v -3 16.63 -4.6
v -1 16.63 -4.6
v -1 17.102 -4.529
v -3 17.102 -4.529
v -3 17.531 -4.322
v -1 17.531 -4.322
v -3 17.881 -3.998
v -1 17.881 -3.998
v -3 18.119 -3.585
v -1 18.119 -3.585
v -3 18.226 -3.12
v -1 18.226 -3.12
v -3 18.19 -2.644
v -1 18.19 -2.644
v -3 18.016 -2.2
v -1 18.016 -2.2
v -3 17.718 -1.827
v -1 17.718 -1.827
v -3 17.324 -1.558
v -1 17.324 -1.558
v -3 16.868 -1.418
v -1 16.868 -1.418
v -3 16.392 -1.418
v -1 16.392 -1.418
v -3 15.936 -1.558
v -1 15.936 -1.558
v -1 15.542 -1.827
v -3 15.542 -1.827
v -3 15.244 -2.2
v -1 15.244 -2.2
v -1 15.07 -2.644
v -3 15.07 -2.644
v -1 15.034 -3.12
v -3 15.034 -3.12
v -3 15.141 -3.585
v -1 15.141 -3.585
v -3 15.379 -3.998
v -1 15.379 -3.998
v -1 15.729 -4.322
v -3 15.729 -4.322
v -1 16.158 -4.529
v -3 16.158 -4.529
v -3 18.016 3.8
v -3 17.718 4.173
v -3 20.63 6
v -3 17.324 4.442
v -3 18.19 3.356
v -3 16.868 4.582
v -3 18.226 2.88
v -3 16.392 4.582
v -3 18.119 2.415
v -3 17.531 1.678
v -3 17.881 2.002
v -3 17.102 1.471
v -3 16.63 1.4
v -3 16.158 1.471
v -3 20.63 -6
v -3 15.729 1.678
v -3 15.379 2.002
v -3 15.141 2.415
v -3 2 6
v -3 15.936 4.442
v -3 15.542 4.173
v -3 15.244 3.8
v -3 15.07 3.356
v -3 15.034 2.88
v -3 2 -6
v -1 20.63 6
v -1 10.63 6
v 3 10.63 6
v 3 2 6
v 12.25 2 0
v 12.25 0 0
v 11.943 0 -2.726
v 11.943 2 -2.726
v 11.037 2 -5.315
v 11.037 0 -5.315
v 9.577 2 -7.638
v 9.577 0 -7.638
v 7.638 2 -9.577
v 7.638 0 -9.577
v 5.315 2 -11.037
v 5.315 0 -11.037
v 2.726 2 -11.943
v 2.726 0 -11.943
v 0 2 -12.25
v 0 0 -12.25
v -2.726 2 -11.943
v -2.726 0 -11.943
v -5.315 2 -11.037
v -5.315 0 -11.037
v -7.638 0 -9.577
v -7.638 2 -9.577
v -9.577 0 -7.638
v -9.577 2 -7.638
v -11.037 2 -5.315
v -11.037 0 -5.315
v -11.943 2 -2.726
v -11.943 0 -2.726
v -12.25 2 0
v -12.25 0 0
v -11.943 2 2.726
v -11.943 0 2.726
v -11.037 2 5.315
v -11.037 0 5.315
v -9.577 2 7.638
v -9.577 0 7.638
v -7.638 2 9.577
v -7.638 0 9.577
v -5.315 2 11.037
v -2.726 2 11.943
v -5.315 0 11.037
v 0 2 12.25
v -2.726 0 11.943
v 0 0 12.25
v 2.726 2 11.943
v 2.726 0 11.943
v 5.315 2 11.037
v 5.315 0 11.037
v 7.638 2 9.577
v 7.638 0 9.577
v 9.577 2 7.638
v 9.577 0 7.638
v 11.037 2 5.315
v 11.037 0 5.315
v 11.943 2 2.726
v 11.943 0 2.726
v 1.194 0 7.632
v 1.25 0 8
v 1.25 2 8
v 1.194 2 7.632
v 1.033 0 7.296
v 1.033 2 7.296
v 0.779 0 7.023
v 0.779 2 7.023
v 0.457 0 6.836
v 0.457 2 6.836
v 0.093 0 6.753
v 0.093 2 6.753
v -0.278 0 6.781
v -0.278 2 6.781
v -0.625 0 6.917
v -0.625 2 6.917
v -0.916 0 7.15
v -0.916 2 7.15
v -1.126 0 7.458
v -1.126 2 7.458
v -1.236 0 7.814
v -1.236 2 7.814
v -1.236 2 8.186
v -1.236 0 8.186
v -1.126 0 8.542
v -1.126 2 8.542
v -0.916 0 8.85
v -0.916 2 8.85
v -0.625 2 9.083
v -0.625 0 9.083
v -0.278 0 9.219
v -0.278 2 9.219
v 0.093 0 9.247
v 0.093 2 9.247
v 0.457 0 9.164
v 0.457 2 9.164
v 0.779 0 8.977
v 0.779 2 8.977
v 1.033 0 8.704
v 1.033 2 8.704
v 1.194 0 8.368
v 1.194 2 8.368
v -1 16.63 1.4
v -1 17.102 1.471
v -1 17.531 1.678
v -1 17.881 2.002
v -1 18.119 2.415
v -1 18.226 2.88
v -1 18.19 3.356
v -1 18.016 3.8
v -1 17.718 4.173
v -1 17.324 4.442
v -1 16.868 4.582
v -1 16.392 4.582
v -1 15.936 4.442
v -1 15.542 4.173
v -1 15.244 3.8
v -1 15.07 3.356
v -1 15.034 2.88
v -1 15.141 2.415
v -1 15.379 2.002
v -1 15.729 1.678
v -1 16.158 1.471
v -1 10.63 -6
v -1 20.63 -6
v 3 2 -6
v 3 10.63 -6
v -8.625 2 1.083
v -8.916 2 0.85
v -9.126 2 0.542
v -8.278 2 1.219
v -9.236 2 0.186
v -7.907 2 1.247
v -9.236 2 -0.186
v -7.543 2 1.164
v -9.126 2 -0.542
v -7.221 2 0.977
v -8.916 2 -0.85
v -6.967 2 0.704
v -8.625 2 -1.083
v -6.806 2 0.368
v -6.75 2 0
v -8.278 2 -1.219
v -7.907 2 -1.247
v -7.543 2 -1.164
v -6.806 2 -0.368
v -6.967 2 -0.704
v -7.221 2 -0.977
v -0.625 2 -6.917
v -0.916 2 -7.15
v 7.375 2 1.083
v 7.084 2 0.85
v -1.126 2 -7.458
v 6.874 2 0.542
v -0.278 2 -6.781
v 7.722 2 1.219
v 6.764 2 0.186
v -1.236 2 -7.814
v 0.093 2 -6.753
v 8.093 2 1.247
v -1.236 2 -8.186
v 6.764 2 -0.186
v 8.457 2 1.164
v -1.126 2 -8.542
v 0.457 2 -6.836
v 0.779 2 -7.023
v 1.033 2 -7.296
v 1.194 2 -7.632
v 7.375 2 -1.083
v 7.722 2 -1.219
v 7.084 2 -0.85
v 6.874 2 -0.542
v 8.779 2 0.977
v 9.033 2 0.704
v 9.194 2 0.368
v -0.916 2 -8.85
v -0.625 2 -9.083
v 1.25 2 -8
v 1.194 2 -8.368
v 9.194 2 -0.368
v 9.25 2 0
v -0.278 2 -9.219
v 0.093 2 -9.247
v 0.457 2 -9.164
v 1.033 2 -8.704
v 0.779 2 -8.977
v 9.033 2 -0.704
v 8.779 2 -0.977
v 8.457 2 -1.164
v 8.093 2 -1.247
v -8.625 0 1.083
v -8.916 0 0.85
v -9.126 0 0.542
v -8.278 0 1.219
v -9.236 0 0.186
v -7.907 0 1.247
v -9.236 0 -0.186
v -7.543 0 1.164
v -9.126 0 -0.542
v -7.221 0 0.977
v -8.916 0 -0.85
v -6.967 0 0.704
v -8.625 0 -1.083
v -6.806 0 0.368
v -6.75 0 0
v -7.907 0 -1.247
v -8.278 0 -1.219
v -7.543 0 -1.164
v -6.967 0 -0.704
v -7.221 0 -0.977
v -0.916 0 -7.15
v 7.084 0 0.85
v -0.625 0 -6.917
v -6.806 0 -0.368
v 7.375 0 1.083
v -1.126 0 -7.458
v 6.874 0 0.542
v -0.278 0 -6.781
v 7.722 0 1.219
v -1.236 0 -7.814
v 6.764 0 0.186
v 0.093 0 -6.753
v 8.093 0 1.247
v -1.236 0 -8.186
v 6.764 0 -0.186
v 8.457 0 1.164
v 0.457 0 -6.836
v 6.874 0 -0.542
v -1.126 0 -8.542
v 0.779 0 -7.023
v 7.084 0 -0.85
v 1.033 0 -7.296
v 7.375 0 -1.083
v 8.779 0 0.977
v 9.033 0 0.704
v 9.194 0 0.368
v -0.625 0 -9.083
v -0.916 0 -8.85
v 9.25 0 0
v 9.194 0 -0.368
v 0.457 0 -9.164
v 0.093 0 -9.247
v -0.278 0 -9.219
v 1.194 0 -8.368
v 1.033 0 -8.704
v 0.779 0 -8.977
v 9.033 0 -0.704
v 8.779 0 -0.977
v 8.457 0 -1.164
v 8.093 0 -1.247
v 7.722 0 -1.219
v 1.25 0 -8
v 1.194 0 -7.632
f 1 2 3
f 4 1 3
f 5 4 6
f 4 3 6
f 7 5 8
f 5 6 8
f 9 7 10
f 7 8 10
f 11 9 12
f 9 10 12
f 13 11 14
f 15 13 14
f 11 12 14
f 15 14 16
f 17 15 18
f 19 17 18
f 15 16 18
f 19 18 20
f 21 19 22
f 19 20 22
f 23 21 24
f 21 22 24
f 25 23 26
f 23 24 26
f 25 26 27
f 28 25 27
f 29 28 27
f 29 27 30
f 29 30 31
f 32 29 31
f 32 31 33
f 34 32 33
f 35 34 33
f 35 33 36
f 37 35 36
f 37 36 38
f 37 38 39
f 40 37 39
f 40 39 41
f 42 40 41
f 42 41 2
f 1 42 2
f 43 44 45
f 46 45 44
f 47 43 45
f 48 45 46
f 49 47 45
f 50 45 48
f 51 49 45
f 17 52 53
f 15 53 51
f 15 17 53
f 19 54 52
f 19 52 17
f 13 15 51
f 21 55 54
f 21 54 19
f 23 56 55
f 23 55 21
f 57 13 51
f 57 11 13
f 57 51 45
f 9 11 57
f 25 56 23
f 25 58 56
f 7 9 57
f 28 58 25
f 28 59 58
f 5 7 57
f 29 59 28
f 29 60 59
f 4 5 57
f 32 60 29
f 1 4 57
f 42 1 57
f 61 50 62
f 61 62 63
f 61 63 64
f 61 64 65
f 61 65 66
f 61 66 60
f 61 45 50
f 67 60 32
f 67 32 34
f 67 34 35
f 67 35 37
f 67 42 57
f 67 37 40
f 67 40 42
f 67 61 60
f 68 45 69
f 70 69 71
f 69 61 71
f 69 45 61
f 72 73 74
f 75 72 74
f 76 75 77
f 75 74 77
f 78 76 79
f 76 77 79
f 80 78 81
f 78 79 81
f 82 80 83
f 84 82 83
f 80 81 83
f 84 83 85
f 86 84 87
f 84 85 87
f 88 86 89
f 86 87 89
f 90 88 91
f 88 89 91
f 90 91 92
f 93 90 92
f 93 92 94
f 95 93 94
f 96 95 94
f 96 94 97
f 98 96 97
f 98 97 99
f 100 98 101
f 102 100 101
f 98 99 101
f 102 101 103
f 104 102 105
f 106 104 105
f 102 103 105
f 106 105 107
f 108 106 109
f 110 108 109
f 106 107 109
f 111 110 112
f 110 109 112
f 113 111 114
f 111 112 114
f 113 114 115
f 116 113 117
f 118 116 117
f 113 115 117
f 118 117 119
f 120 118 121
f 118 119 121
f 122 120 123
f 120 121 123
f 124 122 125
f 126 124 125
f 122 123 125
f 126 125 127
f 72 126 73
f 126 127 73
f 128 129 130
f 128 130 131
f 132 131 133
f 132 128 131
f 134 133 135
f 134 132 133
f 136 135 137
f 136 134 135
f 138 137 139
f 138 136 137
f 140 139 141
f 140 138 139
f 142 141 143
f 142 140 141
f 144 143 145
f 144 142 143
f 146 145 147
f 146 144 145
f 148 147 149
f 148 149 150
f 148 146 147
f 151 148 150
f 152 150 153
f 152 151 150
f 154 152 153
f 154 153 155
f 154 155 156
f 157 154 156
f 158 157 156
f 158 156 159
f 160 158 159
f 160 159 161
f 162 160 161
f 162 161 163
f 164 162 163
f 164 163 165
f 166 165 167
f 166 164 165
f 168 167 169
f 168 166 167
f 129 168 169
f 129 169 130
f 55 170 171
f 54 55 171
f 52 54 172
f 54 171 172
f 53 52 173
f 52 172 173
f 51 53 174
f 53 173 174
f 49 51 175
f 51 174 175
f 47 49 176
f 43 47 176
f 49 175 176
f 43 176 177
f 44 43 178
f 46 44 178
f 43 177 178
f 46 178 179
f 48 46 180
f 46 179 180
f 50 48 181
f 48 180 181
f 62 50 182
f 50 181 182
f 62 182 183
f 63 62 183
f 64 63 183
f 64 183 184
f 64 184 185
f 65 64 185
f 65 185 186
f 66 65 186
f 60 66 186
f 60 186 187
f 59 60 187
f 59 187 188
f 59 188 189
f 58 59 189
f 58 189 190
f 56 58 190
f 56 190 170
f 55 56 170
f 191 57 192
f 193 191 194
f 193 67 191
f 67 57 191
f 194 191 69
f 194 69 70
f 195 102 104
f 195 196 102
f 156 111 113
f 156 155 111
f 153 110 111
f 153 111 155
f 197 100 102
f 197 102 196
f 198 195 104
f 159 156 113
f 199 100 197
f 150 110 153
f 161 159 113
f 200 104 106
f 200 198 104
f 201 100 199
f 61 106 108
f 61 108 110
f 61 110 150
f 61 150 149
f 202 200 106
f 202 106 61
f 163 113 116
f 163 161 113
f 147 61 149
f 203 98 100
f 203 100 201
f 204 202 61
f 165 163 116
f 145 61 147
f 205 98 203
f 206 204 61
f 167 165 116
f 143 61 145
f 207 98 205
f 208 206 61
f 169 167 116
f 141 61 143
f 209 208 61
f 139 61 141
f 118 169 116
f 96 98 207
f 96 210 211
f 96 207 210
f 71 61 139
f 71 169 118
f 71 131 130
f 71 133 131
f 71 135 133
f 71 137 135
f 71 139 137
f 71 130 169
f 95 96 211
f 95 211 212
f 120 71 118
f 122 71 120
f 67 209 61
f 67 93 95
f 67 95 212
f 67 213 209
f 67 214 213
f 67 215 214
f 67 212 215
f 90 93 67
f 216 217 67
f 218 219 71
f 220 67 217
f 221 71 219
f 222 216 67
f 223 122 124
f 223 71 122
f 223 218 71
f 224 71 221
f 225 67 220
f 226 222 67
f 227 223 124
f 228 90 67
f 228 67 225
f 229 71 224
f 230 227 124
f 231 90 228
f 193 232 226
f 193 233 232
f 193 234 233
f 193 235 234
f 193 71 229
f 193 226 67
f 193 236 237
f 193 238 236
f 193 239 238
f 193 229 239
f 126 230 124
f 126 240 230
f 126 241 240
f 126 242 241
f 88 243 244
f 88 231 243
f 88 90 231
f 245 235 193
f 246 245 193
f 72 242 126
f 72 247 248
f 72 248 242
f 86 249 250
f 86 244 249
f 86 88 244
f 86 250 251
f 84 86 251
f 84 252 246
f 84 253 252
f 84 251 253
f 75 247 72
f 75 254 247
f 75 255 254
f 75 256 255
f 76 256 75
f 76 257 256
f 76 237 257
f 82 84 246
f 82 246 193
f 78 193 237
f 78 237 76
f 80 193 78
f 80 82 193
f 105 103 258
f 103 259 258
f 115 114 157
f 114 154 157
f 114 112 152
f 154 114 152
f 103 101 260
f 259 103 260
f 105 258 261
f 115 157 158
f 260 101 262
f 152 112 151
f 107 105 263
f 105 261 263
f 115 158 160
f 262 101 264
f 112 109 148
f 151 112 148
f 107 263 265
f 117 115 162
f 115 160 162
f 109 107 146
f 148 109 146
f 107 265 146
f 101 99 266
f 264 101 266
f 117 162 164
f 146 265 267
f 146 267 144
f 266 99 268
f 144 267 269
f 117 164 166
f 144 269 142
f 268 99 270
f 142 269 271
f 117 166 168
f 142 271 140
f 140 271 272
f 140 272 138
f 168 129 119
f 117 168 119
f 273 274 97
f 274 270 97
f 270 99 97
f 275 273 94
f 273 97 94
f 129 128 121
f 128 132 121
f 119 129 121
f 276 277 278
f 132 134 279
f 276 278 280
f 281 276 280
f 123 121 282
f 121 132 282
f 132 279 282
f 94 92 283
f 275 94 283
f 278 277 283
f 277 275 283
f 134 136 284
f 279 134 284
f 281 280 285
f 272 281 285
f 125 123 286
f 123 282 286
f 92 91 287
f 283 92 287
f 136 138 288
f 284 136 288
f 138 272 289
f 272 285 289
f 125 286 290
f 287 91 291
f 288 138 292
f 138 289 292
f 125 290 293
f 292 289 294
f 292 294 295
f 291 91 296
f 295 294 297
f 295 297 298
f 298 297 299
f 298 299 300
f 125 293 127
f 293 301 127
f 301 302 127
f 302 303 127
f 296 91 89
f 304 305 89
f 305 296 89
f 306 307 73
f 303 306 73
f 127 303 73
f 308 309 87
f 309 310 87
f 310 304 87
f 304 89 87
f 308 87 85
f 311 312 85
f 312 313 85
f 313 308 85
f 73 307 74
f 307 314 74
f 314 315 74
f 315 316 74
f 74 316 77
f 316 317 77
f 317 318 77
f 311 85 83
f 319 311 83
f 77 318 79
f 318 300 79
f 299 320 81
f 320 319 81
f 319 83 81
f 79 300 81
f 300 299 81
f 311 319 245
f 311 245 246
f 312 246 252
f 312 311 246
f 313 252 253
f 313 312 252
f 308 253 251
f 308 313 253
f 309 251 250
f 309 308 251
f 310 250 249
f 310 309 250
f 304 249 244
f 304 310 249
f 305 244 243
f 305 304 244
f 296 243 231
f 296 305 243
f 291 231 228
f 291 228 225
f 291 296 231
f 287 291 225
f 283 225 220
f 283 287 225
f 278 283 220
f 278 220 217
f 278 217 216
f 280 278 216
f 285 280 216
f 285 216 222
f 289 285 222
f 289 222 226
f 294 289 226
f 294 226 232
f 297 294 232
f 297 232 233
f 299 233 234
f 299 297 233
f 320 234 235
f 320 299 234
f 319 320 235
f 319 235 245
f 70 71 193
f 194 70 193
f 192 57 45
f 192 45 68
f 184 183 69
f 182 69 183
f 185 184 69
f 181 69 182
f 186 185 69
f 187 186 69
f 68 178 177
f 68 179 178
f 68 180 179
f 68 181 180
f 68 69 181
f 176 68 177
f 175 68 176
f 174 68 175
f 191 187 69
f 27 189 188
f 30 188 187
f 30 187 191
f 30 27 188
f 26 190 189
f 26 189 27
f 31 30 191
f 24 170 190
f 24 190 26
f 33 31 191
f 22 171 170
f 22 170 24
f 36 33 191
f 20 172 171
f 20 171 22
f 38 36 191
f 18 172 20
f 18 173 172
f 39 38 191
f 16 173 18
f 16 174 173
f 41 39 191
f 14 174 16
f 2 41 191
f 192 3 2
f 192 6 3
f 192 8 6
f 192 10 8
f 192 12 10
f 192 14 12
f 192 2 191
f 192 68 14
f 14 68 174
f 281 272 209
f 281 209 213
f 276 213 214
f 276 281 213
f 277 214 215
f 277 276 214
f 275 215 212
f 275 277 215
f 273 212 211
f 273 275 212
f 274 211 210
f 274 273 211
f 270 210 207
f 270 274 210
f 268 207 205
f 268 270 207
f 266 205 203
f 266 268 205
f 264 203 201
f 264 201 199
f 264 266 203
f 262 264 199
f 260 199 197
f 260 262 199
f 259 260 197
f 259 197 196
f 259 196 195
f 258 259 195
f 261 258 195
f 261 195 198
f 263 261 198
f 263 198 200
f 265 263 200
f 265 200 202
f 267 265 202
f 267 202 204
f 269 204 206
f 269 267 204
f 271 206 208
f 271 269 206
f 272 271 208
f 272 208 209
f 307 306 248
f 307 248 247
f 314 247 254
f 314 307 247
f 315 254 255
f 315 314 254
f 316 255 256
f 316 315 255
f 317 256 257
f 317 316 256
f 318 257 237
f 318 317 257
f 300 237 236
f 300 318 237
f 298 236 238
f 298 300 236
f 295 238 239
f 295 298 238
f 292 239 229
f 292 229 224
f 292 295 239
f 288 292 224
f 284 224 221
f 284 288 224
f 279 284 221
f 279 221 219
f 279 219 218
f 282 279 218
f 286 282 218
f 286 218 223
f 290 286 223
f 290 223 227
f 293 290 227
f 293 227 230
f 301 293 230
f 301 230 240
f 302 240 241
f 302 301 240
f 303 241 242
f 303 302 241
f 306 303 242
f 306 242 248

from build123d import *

# Parameters (mm, degrees)
SKETCH_1_R          = 12.25
SKETCH_1_R_2        = 1.25
EXTRUDE_1_DEPTH     = 2
SKETCH_2_R          = 3
EXTRUDE_2_DEPTH     = 10.63
SKETCH_3_W          = 2
SKETCH_3_H          = 12
EXTRUDE_3_DEPTH     = 8
SKETCH_5_R          = 1.6
CUT_EXTRUDE_1_DEPTH = 10
SKETCH_6_W          = 6
SKETCH_6_H          = 12
EXTRUDE_4_DEPTH     = 10.63
SKETCH_7_W          = 4
SKETCH_7_H          = 12
CUT_EXTRUDE_2_DEPTH = 2


with BuildPart() as part:
    # 草图1 → 凸台-拉伸1 (new body)
    with BuildSketch(Plane(origin=(0, 0, 0), x_dir=(1, 0, 0), z_dir=(0, 1, 0))):
        Circle(SKETCH_1_R)
        with Locations((8, 0)):
            Circle(SKETCH_1_R_2, mode=Mode.SUBTRACT)
        with Locations((0, -8)):
            Circle(SKETCH_1_R_2, mode=Mode.SUBTRACT)
        with Locations((-8, 0)):
            Circle(SKETCH_1_R_2, mode=Mode.SUBTRACT)
        with Locations((0, 8)):
            Circle(SKETCH_1_R_2, mode=Mode.SUBTRACT)
    extrude(amount=EXTRUDE_1_DEPTH)

    # 草图2 → 凸台-拉伸2 (add)
    with BuildSketch(Plane(origin=(0, 2, 0), x_dir=(1, 0, 0), z_dir=(0, 1, 0))):
        Circle(SKETCH_2_R)
    extrude(amount=EXTRUDE_2_DEPTH)

    # 草图3 → 凸台-拉伸3 (add)
    with BuildSketch(Plane(origin=(0, 12.63, 0), x_dir=(1, 0, 0), z_dir=(0, 1, 0))):
        with Locations((-2, 0)):
            Rectangle(SKETCH_3_W, SKETCH_3_H)
    extrude(amount=EXTRUDE_3_DEPTH)

    # 草图5 → 切除-拉伸1 (cut)
    with BuildSketch(Plane(origin=(-1, 0, 0), x_dir=(0, 0, -1), z_dir=(1, 0, 0))):
        with Locations((3, 16.63)):
            Circle(SKETCH_5_R)
        with Locations((-3, 16.63)):
            Circle(SKETCH_5_R)
    extrude(amount=-CUT_EXTRUDE_1_DEPTH, mode=Mode.SUBTRACT)

    # 草图6 → 凸台-拉伸4 (add)
    with BuildSketch(Plane(origin=(0, 2, 0), x_dir=(1, 0, 0), z_dir=(0, 1, 0))):
        Rectangle(SKETCH_6_W, SKETCH_6_H)
    extrude(amount=EXTRUDE_4_DEPTH)

    # 草图7 → 切除-拉伸2 (cut)
    with BuildSketch(Plane(origin=(0, 12.63, 0), x_dir=(1, 0, 0), z_dir=(0, 1, 0))):
        with Locations((1, 0)):
            Rectangle(SKETCH_7_W, SKETCH_7_H)
    extrude(amount=-CUT_EXTRUDE_2_DEPTH, mode=Mode.SUBTRACT)


solid = part.part
